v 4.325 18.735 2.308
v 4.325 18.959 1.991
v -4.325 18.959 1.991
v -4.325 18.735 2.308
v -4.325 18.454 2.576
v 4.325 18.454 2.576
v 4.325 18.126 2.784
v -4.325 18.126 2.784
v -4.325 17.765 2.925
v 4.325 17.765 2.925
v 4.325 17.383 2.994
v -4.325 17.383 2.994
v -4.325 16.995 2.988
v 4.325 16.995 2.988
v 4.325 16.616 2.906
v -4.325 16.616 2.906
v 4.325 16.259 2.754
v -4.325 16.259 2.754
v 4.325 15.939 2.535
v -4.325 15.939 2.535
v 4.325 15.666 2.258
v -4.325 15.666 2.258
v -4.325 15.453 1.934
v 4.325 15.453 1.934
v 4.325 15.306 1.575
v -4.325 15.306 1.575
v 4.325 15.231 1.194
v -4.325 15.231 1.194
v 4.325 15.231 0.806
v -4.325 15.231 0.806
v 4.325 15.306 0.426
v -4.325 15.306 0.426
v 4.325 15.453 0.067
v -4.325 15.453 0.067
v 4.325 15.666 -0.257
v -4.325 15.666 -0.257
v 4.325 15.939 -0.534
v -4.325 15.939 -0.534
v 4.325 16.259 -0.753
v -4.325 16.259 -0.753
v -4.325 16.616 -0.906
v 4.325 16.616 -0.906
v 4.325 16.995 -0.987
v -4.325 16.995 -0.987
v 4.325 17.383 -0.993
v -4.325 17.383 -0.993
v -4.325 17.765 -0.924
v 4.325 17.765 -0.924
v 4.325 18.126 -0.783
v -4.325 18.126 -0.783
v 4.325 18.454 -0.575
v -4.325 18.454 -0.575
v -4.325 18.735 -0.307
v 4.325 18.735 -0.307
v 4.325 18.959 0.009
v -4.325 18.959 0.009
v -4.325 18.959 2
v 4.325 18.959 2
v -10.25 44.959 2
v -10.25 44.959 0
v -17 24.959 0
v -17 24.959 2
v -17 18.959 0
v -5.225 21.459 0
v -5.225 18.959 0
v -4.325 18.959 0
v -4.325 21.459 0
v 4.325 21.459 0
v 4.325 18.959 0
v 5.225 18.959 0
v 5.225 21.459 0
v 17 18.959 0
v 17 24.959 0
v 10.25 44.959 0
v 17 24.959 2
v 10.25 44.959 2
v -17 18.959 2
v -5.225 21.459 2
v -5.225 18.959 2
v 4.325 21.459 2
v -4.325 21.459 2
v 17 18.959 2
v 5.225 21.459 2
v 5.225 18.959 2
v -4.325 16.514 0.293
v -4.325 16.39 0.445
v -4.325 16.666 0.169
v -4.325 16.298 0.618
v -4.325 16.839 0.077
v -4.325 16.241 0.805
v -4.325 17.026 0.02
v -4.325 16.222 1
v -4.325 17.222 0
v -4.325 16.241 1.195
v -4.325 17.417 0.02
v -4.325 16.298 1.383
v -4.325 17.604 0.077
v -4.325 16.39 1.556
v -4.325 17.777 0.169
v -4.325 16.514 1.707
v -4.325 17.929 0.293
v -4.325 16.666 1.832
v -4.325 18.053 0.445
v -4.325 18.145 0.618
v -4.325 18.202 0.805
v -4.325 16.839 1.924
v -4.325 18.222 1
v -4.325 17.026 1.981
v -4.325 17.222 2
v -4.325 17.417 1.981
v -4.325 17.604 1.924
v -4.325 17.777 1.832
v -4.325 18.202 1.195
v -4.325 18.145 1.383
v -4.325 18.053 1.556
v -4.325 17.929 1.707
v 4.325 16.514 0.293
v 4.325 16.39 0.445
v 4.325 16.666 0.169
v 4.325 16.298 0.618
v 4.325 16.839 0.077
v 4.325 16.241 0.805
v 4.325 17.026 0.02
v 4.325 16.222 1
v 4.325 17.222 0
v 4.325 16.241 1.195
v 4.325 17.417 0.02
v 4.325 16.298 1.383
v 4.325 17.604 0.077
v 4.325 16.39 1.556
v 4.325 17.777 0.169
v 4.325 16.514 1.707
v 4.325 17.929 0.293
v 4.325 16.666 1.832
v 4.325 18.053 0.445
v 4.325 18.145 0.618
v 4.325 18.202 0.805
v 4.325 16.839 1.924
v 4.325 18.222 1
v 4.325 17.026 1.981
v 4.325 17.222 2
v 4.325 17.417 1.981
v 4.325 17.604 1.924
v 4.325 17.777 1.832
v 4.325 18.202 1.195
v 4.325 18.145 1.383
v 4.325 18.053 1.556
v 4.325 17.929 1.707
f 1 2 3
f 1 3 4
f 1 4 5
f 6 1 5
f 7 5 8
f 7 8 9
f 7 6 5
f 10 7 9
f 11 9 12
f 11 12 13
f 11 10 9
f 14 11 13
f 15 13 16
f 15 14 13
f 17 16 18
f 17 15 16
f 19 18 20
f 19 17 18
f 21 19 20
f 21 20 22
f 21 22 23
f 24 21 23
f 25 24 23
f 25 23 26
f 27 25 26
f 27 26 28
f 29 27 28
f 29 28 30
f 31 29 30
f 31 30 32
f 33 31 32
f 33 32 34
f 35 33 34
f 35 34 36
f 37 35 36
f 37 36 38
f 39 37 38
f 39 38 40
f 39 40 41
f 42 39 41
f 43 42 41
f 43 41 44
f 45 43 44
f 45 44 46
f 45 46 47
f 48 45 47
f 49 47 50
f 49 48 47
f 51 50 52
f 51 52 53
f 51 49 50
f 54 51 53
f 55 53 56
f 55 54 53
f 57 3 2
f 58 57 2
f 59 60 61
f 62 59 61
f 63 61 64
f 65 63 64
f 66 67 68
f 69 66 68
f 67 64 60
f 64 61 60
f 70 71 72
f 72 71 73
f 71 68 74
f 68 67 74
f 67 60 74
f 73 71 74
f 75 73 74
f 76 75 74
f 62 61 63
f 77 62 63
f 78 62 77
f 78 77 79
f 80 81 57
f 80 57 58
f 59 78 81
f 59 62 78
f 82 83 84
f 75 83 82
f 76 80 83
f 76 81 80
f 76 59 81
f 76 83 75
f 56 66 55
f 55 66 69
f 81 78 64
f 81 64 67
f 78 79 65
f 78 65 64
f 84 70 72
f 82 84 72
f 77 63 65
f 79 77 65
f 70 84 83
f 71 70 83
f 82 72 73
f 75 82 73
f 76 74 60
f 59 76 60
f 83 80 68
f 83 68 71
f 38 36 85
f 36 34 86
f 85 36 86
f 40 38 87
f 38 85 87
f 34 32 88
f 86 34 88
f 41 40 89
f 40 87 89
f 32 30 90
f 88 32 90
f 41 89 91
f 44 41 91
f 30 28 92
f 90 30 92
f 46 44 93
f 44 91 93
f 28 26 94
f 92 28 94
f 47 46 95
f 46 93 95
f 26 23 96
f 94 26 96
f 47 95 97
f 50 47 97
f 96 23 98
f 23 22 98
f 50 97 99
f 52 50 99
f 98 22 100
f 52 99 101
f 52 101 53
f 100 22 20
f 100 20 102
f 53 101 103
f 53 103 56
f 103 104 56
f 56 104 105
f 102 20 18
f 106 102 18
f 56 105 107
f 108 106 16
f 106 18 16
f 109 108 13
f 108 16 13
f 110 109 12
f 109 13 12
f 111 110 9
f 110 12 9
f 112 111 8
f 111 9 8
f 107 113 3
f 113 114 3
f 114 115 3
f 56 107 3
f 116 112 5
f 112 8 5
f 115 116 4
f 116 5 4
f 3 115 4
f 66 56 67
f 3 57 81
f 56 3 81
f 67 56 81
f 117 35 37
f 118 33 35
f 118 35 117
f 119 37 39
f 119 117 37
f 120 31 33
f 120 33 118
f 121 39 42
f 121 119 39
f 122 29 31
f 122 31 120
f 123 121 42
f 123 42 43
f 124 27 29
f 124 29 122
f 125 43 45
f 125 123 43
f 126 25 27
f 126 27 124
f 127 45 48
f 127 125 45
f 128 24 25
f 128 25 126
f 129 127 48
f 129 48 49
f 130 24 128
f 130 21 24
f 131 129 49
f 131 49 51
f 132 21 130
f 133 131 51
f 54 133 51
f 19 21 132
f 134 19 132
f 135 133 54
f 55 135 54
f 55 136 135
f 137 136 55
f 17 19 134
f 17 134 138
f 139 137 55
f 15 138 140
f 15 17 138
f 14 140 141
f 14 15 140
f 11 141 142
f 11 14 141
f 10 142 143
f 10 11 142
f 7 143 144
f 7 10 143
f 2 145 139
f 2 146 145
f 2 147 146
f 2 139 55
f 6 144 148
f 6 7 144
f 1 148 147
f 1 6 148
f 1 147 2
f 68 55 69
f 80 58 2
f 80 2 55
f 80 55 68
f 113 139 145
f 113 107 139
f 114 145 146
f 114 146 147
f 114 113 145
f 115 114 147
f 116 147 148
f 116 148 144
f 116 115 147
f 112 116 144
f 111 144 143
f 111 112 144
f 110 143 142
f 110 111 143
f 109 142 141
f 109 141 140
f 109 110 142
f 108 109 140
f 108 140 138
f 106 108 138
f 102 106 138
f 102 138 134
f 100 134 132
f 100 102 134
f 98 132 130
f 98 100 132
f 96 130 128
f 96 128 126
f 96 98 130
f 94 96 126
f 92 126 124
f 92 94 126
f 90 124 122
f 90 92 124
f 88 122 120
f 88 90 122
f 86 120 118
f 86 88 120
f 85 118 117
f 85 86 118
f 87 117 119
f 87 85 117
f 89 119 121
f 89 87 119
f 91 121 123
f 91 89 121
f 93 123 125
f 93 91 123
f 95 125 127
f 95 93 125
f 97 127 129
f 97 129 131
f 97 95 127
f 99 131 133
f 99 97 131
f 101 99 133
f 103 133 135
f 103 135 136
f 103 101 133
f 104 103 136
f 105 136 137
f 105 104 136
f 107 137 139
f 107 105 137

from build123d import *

# Parameters (mm, degrees)
F1_DEPTH      = 2
F2_R          = 2
F2_R_2        = 1
F3_DEPTH      = 4.325
F3_DEPTH_BACK = 4.325
F4_W          = 0.9
F4_H          = 2.5
F5_DEPTH      = 3.00062


with BuildPart() as f1:
    # F0 (on Top) → F1 (new body)
    with BuildSketch(Plane.XY):
        Polygon((0, 18.958714), (17, 18.958714), (17, 24.958714), (10.25, 44.958714), (0, 44.958714), (-10.25, 44.958714), (-17, 24.958714), (-17, 18.958714), align=None)
    extrude(amount=F1_DEPTH)

    # F2 (on Right) → F3 (join, two sides)
    with BuildSketch(Plane.YZ) as f3_sk:
        with Locations((17.221542, 1.00038)):
            Circle(F2_R)
        with Locations((17.221542, 1.00038)):
            Circle(F2_R_2, mode=Mode.SUBTRACT)
    extrude(amount=F3_DEPTH)
    extrude(f3_sk.sketch, amount=-F3_DEPTH_BACK)

    # F4 (on face) → F5 (cut, through all)
    with BuildSketch(Plane.XY.offset(2)):
        with Locations((-4.775, 20.208714)):
            Rectangle(F4_W, F4_H)
        with Locations((4.775, 20.208714)):
            Rectangle(F4_W, F4_H)
    extrude(amount=-F5_DEPTH, mode=Mode.SUBTRACT)


solid = f1.part
